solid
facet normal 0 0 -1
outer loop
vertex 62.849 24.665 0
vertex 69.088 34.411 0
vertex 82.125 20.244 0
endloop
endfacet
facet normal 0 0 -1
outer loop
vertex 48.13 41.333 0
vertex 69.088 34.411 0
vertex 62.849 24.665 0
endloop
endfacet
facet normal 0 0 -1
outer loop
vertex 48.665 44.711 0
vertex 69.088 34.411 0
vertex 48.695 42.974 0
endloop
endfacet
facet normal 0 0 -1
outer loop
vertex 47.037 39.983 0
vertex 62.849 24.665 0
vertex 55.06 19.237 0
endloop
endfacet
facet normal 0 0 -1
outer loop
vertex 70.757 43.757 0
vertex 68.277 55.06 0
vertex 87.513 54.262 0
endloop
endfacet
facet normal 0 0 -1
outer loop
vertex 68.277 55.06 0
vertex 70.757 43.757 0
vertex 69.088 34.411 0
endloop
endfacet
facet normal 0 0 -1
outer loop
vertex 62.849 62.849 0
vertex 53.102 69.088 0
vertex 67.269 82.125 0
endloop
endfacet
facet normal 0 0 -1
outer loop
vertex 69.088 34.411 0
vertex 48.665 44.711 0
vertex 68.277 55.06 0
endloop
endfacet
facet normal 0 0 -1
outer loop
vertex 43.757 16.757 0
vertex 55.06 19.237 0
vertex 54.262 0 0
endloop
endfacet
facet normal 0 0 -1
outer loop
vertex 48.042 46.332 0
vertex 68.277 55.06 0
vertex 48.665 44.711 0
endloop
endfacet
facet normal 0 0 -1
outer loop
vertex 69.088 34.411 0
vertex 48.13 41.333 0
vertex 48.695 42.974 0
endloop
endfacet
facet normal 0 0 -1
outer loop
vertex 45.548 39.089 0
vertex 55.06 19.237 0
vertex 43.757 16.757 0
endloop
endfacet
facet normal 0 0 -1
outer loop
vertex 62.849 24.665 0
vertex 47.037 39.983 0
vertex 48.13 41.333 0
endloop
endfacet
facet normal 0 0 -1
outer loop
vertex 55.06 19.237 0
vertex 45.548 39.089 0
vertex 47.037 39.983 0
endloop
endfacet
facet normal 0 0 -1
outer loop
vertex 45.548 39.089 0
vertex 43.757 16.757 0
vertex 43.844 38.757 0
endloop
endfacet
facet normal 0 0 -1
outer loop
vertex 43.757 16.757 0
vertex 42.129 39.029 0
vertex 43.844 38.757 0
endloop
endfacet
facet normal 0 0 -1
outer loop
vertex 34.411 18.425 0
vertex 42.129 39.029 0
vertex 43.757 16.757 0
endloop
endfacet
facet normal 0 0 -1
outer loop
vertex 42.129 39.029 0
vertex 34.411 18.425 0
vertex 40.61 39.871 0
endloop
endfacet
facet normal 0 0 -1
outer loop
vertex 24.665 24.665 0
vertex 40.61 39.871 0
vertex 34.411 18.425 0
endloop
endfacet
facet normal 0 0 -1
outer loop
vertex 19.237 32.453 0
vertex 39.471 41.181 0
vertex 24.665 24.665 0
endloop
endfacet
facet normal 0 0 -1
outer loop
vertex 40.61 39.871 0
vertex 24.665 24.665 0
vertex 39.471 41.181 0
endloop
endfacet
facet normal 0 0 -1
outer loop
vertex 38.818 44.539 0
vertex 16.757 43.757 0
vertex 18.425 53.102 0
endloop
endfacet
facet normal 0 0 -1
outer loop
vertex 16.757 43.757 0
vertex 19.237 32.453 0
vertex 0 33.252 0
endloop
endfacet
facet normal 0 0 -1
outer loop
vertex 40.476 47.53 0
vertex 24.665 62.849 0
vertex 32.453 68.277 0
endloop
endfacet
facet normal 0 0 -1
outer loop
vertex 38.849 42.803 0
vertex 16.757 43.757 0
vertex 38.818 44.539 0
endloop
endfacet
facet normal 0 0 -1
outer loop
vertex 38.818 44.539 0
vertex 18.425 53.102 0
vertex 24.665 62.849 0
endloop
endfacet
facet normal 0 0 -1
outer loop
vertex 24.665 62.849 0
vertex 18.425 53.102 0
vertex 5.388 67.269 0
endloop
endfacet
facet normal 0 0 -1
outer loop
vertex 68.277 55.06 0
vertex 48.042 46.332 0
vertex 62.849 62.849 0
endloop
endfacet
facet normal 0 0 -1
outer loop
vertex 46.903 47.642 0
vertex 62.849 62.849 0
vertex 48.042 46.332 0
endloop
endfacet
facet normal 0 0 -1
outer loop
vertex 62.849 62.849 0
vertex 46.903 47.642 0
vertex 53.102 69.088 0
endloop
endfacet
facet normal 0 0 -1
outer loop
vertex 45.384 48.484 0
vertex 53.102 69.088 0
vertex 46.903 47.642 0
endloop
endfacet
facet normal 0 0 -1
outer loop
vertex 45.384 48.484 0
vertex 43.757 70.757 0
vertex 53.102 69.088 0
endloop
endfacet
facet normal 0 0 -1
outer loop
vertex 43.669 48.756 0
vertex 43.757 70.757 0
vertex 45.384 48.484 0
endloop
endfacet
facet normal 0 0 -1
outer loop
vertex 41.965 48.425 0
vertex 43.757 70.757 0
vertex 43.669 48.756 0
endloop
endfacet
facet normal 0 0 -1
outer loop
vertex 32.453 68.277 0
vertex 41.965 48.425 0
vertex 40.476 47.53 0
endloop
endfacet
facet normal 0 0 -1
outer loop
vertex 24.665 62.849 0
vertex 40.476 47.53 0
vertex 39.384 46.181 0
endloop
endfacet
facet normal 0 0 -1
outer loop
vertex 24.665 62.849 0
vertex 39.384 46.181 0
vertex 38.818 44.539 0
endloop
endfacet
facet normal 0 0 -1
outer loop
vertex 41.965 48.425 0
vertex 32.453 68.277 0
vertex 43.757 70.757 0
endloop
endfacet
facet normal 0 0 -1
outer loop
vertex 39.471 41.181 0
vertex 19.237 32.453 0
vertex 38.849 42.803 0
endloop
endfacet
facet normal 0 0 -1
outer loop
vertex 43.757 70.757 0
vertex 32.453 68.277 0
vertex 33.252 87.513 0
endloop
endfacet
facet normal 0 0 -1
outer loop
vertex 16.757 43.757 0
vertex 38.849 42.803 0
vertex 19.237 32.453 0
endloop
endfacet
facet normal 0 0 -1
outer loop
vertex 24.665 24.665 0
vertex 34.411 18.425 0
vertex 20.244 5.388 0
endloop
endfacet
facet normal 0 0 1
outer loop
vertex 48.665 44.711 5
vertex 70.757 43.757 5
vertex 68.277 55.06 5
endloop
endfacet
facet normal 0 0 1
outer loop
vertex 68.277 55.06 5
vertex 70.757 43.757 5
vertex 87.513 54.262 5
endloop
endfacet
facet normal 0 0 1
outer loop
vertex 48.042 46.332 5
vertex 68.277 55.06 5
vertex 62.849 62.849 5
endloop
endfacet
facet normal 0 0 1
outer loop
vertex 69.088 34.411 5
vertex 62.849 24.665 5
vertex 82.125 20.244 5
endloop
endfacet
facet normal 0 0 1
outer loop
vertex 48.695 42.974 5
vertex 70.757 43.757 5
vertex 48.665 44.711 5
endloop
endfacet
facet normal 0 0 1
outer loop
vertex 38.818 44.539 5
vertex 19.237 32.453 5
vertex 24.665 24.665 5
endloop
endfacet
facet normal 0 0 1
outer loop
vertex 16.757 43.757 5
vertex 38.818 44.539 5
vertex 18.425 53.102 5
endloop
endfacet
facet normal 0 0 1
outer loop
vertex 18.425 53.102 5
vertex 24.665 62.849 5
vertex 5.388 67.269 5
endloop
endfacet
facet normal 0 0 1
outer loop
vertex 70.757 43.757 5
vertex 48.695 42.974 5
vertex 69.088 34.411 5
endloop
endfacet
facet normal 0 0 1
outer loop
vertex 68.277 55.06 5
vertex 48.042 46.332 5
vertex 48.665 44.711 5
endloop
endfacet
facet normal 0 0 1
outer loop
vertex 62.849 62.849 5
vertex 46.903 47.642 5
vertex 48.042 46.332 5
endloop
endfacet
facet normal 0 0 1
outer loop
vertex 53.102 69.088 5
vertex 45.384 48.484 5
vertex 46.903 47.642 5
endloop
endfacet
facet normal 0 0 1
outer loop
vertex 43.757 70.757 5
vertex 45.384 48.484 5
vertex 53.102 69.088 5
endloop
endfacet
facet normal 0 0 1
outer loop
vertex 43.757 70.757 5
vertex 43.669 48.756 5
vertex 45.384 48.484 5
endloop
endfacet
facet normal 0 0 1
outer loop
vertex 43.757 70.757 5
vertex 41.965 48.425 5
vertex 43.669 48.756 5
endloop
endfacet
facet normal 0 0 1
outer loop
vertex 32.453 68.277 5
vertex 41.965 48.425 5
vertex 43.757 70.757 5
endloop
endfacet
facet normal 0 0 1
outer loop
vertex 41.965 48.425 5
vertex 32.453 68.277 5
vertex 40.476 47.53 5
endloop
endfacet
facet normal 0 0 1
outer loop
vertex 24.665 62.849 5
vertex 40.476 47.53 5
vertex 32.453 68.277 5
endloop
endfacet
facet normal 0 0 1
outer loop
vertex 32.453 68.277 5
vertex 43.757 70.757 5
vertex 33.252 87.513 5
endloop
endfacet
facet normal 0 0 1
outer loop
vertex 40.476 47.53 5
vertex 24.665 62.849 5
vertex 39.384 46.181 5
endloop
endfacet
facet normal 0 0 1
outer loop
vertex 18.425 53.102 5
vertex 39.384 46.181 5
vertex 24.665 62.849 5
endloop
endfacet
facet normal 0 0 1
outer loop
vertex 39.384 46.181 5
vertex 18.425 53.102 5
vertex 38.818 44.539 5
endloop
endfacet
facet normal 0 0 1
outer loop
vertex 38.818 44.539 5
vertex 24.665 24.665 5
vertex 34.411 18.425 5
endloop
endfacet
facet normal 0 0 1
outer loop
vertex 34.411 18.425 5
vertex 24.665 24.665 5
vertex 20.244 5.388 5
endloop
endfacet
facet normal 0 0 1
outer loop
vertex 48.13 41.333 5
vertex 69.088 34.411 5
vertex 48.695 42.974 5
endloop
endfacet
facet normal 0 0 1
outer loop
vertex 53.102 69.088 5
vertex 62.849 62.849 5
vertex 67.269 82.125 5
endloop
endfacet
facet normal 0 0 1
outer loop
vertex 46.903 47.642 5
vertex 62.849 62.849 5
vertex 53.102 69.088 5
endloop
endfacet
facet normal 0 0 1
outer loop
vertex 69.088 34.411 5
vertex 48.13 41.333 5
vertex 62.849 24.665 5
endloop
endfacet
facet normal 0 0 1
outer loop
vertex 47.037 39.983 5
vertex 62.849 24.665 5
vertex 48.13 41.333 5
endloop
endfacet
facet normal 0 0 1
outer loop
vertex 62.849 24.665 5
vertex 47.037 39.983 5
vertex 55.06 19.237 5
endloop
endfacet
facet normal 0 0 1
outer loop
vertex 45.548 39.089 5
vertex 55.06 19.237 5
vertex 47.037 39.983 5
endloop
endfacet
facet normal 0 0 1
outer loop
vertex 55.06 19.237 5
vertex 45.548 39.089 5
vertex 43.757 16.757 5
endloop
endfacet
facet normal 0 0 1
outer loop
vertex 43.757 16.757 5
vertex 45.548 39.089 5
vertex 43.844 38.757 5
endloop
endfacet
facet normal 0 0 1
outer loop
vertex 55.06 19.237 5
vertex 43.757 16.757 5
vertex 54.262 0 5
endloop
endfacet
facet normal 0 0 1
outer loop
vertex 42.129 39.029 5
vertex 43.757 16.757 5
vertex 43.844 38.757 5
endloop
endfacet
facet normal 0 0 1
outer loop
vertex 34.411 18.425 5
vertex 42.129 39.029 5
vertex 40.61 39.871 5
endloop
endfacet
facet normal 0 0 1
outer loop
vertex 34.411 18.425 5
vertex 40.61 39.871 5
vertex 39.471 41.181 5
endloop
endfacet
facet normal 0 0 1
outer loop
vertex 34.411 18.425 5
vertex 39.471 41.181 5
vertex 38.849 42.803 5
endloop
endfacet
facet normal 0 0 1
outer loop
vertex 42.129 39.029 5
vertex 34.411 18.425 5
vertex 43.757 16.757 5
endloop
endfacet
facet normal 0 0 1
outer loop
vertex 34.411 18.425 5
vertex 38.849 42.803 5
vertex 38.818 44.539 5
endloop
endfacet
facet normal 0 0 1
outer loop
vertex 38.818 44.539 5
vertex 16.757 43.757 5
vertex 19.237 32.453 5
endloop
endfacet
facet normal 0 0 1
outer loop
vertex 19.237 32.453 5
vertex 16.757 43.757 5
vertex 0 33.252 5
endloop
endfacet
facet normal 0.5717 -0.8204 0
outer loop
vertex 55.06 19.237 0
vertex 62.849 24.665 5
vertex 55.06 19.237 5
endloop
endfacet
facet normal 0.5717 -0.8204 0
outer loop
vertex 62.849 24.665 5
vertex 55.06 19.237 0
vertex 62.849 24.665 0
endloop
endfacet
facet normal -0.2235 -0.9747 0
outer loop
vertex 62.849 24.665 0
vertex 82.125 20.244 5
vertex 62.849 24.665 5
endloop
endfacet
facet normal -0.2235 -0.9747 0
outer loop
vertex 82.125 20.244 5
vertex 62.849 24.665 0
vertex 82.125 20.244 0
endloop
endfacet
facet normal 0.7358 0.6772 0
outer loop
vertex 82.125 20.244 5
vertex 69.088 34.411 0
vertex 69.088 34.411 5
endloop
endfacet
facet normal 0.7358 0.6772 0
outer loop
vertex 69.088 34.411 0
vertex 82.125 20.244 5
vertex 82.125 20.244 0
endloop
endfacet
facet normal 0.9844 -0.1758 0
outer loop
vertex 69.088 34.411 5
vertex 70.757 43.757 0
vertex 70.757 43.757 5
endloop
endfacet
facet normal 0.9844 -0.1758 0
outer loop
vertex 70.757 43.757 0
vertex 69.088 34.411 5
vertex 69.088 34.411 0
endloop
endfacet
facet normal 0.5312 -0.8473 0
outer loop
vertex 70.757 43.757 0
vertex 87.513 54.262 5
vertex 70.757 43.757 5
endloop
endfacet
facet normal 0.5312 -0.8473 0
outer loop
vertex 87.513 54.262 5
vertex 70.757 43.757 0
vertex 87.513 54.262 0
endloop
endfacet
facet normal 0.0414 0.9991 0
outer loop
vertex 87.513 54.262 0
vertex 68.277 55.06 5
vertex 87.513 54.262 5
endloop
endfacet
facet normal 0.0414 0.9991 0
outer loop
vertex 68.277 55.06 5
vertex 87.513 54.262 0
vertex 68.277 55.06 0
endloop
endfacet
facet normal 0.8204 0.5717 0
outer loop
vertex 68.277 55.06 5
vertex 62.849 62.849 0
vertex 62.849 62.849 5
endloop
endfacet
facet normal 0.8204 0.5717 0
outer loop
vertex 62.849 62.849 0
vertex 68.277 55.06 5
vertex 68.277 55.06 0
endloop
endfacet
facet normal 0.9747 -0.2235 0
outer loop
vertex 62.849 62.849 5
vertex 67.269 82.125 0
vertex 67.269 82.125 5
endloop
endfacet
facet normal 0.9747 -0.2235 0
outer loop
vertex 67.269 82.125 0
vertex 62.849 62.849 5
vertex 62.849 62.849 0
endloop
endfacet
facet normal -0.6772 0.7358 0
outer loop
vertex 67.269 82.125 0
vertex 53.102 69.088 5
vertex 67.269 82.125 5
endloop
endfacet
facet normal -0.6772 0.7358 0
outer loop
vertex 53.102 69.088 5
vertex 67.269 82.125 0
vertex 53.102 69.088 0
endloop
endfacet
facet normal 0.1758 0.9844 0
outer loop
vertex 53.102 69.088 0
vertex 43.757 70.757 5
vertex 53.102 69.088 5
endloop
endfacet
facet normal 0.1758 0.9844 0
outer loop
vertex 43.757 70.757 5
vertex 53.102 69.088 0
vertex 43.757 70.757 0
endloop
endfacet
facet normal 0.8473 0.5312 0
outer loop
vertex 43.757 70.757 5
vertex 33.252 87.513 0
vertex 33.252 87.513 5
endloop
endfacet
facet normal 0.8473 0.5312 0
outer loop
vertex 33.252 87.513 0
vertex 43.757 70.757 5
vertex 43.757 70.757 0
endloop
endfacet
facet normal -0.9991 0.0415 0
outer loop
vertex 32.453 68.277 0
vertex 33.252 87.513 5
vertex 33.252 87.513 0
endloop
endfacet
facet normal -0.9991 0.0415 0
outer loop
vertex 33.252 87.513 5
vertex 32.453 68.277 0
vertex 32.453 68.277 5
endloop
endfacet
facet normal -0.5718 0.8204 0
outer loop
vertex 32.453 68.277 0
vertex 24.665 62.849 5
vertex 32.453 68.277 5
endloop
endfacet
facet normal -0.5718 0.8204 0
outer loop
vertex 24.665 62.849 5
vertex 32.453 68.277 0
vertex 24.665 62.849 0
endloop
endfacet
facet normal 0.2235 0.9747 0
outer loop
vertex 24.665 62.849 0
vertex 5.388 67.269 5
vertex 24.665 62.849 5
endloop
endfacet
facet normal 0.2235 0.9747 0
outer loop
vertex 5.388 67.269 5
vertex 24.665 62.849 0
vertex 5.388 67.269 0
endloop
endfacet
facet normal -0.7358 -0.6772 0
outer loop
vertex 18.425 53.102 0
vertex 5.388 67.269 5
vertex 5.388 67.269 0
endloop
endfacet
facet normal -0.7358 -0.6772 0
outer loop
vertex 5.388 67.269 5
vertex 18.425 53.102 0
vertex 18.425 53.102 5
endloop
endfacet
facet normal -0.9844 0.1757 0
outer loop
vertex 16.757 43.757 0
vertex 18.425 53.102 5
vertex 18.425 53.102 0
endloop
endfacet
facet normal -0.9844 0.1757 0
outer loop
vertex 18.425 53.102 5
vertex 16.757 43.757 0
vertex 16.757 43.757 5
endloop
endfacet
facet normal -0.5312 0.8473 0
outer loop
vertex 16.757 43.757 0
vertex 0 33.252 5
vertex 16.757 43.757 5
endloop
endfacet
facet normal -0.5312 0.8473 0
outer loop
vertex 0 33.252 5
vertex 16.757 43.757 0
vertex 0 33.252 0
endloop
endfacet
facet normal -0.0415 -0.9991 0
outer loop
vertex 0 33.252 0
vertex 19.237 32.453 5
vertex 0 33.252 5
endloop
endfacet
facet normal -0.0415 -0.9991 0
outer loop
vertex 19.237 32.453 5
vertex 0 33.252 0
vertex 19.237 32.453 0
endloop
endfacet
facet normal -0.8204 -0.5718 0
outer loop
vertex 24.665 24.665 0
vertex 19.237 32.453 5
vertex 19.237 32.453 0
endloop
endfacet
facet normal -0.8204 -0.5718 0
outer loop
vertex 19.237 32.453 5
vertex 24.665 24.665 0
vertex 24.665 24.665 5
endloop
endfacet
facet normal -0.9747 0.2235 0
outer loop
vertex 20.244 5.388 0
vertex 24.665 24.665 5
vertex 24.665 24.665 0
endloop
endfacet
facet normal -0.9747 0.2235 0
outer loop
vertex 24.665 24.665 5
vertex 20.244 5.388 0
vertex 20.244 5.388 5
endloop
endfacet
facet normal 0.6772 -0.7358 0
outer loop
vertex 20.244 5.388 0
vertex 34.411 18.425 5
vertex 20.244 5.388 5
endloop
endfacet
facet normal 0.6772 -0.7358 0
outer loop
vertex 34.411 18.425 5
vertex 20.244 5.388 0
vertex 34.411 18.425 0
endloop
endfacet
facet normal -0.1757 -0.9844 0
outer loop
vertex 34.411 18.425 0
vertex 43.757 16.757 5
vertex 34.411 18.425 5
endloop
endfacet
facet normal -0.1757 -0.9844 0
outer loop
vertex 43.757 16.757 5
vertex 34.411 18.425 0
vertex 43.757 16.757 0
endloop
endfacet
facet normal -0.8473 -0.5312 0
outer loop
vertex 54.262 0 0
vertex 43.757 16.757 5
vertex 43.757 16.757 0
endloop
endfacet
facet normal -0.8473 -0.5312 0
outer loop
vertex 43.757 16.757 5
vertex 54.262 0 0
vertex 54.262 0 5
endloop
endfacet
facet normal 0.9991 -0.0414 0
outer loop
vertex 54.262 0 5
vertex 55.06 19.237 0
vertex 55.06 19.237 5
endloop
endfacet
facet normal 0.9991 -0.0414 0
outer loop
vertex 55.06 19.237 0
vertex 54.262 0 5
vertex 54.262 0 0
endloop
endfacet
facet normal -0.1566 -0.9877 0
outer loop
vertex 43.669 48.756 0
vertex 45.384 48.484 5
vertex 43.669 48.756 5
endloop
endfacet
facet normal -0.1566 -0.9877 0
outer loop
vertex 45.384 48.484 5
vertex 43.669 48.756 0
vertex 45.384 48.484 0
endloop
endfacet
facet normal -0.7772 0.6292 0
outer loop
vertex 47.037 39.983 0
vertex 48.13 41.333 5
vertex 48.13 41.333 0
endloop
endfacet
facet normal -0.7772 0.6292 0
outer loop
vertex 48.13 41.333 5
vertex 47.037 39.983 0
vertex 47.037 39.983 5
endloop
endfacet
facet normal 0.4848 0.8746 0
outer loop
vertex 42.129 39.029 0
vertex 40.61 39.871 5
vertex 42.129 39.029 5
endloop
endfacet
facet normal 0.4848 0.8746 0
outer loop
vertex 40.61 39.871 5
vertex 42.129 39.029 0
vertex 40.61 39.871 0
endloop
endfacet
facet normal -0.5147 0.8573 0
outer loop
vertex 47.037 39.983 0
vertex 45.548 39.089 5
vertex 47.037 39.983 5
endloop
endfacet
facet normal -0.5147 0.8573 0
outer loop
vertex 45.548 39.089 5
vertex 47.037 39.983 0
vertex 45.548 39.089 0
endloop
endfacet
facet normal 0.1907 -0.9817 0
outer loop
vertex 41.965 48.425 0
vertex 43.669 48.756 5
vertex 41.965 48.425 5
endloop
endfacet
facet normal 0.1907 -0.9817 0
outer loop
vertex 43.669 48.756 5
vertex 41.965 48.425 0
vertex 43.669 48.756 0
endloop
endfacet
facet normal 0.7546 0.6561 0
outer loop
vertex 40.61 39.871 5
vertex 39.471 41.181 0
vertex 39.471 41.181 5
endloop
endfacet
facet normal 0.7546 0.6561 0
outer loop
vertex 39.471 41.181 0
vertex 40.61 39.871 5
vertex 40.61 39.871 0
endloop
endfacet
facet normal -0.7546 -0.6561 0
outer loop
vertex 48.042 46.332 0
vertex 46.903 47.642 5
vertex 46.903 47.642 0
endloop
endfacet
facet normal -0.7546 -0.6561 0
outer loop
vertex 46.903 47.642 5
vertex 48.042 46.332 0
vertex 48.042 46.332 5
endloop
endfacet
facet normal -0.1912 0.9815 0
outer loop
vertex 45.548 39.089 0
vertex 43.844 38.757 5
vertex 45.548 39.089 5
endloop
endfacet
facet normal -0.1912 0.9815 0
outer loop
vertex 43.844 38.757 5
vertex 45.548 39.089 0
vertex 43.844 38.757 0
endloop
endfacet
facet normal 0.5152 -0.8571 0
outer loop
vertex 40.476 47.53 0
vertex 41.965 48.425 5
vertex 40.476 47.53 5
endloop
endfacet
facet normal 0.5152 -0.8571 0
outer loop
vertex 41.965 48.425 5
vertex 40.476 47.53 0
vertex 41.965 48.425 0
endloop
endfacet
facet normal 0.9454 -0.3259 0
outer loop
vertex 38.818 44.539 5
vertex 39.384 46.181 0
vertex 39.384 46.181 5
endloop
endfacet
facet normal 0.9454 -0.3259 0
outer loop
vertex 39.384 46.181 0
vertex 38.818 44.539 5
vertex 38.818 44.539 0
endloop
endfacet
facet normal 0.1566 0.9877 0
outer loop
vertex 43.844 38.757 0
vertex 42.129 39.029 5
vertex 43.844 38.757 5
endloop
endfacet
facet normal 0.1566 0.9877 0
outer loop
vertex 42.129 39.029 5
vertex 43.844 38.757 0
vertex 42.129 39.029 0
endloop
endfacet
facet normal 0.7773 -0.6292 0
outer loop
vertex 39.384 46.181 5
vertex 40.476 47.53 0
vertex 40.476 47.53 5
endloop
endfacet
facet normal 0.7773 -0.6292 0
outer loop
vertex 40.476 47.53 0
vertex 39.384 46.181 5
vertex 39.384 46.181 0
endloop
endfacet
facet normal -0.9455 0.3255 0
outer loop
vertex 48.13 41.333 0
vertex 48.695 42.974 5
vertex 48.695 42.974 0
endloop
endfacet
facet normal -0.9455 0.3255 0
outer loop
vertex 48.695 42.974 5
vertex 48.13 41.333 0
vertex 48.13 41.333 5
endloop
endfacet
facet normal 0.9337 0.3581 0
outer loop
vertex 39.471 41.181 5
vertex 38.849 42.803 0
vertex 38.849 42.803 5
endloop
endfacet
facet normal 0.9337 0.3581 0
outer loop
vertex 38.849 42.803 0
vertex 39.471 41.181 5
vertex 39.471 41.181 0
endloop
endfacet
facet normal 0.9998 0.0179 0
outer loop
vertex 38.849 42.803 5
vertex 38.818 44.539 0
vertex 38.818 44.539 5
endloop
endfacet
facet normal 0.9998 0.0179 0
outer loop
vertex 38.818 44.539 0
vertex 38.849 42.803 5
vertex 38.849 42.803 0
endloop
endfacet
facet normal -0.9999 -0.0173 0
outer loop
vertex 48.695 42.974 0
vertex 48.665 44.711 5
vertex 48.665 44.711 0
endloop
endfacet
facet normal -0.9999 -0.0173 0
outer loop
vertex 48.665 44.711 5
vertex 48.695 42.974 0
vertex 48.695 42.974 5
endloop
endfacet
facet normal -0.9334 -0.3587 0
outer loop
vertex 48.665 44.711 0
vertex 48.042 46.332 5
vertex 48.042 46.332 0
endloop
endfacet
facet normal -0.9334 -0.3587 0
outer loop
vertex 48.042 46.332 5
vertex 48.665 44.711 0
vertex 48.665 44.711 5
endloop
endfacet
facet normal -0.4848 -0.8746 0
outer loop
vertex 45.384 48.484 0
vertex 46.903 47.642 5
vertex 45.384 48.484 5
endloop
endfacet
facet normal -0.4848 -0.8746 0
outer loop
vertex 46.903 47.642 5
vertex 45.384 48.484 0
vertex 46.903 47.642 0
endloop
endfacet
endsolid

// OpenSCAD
$fn = 32;

// ----------------------------------------------------------------------
// Star wheel: 8-point ratchet, R45
// ----------------------------------------------------------------------

// --- parameters (mm) ---
n_points = 8;             // number of points / teeth
r_out = 45;               // tip radius
r_in = 27;                // root radius
bore_r = 5;               // centre bore radius
plate_t = 5;              // plate thickness, Z (extrusion height)
bore_d = 10;              // centre bore diameter

profile = [[43.757, 70.757], [33.252, 87.513], [32.453, 68.277], [24.665, 62.849], [5.388, 67.269], [18.425, 53.102], [16.757, 43.757], [0, 33.252], [19.237, 32.453], [24.665, 24.665], [20.244, 5.388], [34.411, 18.425], [43.757, 16.757], [54.262, 0], [55.06, 19.237], [62.849, 24.665], [82.125, 20.244], [69.088, 34.411], [70.757, 43.757], [87.513, 54.262], [68.277, 55.06], [62.849, 62.849], [67.269, 82.125], [53.102, 69.088]];  // primary outline, 24 points, counter clockwise
void_1 = [[48.665, 44.711], [48.042, 46.332], [46.903, 47.642], [45.384, 48.484], [43.669, 48.756], [41.965, 48.425], [40.476, 47.53], [39.384, 46.181], [38.818, 44.539], [38.849, 42.803], [39.471, 41.181], [40.61, 39.871], [42.129, 39.029], [43.844, 38.757], [45.548, 39.089], [47.037, 39.983], [48.13, 41.333], [48.695, 42.974]];  // centre bore, 18 points

// --- the one profile operation ---
difference() {
  linear_extrude(height = plate_t) polygon(points = profile);
  translate([0, 0, -1])
    linear_extrude(height = plate_t + 2) polygon(points = void_1);
}
